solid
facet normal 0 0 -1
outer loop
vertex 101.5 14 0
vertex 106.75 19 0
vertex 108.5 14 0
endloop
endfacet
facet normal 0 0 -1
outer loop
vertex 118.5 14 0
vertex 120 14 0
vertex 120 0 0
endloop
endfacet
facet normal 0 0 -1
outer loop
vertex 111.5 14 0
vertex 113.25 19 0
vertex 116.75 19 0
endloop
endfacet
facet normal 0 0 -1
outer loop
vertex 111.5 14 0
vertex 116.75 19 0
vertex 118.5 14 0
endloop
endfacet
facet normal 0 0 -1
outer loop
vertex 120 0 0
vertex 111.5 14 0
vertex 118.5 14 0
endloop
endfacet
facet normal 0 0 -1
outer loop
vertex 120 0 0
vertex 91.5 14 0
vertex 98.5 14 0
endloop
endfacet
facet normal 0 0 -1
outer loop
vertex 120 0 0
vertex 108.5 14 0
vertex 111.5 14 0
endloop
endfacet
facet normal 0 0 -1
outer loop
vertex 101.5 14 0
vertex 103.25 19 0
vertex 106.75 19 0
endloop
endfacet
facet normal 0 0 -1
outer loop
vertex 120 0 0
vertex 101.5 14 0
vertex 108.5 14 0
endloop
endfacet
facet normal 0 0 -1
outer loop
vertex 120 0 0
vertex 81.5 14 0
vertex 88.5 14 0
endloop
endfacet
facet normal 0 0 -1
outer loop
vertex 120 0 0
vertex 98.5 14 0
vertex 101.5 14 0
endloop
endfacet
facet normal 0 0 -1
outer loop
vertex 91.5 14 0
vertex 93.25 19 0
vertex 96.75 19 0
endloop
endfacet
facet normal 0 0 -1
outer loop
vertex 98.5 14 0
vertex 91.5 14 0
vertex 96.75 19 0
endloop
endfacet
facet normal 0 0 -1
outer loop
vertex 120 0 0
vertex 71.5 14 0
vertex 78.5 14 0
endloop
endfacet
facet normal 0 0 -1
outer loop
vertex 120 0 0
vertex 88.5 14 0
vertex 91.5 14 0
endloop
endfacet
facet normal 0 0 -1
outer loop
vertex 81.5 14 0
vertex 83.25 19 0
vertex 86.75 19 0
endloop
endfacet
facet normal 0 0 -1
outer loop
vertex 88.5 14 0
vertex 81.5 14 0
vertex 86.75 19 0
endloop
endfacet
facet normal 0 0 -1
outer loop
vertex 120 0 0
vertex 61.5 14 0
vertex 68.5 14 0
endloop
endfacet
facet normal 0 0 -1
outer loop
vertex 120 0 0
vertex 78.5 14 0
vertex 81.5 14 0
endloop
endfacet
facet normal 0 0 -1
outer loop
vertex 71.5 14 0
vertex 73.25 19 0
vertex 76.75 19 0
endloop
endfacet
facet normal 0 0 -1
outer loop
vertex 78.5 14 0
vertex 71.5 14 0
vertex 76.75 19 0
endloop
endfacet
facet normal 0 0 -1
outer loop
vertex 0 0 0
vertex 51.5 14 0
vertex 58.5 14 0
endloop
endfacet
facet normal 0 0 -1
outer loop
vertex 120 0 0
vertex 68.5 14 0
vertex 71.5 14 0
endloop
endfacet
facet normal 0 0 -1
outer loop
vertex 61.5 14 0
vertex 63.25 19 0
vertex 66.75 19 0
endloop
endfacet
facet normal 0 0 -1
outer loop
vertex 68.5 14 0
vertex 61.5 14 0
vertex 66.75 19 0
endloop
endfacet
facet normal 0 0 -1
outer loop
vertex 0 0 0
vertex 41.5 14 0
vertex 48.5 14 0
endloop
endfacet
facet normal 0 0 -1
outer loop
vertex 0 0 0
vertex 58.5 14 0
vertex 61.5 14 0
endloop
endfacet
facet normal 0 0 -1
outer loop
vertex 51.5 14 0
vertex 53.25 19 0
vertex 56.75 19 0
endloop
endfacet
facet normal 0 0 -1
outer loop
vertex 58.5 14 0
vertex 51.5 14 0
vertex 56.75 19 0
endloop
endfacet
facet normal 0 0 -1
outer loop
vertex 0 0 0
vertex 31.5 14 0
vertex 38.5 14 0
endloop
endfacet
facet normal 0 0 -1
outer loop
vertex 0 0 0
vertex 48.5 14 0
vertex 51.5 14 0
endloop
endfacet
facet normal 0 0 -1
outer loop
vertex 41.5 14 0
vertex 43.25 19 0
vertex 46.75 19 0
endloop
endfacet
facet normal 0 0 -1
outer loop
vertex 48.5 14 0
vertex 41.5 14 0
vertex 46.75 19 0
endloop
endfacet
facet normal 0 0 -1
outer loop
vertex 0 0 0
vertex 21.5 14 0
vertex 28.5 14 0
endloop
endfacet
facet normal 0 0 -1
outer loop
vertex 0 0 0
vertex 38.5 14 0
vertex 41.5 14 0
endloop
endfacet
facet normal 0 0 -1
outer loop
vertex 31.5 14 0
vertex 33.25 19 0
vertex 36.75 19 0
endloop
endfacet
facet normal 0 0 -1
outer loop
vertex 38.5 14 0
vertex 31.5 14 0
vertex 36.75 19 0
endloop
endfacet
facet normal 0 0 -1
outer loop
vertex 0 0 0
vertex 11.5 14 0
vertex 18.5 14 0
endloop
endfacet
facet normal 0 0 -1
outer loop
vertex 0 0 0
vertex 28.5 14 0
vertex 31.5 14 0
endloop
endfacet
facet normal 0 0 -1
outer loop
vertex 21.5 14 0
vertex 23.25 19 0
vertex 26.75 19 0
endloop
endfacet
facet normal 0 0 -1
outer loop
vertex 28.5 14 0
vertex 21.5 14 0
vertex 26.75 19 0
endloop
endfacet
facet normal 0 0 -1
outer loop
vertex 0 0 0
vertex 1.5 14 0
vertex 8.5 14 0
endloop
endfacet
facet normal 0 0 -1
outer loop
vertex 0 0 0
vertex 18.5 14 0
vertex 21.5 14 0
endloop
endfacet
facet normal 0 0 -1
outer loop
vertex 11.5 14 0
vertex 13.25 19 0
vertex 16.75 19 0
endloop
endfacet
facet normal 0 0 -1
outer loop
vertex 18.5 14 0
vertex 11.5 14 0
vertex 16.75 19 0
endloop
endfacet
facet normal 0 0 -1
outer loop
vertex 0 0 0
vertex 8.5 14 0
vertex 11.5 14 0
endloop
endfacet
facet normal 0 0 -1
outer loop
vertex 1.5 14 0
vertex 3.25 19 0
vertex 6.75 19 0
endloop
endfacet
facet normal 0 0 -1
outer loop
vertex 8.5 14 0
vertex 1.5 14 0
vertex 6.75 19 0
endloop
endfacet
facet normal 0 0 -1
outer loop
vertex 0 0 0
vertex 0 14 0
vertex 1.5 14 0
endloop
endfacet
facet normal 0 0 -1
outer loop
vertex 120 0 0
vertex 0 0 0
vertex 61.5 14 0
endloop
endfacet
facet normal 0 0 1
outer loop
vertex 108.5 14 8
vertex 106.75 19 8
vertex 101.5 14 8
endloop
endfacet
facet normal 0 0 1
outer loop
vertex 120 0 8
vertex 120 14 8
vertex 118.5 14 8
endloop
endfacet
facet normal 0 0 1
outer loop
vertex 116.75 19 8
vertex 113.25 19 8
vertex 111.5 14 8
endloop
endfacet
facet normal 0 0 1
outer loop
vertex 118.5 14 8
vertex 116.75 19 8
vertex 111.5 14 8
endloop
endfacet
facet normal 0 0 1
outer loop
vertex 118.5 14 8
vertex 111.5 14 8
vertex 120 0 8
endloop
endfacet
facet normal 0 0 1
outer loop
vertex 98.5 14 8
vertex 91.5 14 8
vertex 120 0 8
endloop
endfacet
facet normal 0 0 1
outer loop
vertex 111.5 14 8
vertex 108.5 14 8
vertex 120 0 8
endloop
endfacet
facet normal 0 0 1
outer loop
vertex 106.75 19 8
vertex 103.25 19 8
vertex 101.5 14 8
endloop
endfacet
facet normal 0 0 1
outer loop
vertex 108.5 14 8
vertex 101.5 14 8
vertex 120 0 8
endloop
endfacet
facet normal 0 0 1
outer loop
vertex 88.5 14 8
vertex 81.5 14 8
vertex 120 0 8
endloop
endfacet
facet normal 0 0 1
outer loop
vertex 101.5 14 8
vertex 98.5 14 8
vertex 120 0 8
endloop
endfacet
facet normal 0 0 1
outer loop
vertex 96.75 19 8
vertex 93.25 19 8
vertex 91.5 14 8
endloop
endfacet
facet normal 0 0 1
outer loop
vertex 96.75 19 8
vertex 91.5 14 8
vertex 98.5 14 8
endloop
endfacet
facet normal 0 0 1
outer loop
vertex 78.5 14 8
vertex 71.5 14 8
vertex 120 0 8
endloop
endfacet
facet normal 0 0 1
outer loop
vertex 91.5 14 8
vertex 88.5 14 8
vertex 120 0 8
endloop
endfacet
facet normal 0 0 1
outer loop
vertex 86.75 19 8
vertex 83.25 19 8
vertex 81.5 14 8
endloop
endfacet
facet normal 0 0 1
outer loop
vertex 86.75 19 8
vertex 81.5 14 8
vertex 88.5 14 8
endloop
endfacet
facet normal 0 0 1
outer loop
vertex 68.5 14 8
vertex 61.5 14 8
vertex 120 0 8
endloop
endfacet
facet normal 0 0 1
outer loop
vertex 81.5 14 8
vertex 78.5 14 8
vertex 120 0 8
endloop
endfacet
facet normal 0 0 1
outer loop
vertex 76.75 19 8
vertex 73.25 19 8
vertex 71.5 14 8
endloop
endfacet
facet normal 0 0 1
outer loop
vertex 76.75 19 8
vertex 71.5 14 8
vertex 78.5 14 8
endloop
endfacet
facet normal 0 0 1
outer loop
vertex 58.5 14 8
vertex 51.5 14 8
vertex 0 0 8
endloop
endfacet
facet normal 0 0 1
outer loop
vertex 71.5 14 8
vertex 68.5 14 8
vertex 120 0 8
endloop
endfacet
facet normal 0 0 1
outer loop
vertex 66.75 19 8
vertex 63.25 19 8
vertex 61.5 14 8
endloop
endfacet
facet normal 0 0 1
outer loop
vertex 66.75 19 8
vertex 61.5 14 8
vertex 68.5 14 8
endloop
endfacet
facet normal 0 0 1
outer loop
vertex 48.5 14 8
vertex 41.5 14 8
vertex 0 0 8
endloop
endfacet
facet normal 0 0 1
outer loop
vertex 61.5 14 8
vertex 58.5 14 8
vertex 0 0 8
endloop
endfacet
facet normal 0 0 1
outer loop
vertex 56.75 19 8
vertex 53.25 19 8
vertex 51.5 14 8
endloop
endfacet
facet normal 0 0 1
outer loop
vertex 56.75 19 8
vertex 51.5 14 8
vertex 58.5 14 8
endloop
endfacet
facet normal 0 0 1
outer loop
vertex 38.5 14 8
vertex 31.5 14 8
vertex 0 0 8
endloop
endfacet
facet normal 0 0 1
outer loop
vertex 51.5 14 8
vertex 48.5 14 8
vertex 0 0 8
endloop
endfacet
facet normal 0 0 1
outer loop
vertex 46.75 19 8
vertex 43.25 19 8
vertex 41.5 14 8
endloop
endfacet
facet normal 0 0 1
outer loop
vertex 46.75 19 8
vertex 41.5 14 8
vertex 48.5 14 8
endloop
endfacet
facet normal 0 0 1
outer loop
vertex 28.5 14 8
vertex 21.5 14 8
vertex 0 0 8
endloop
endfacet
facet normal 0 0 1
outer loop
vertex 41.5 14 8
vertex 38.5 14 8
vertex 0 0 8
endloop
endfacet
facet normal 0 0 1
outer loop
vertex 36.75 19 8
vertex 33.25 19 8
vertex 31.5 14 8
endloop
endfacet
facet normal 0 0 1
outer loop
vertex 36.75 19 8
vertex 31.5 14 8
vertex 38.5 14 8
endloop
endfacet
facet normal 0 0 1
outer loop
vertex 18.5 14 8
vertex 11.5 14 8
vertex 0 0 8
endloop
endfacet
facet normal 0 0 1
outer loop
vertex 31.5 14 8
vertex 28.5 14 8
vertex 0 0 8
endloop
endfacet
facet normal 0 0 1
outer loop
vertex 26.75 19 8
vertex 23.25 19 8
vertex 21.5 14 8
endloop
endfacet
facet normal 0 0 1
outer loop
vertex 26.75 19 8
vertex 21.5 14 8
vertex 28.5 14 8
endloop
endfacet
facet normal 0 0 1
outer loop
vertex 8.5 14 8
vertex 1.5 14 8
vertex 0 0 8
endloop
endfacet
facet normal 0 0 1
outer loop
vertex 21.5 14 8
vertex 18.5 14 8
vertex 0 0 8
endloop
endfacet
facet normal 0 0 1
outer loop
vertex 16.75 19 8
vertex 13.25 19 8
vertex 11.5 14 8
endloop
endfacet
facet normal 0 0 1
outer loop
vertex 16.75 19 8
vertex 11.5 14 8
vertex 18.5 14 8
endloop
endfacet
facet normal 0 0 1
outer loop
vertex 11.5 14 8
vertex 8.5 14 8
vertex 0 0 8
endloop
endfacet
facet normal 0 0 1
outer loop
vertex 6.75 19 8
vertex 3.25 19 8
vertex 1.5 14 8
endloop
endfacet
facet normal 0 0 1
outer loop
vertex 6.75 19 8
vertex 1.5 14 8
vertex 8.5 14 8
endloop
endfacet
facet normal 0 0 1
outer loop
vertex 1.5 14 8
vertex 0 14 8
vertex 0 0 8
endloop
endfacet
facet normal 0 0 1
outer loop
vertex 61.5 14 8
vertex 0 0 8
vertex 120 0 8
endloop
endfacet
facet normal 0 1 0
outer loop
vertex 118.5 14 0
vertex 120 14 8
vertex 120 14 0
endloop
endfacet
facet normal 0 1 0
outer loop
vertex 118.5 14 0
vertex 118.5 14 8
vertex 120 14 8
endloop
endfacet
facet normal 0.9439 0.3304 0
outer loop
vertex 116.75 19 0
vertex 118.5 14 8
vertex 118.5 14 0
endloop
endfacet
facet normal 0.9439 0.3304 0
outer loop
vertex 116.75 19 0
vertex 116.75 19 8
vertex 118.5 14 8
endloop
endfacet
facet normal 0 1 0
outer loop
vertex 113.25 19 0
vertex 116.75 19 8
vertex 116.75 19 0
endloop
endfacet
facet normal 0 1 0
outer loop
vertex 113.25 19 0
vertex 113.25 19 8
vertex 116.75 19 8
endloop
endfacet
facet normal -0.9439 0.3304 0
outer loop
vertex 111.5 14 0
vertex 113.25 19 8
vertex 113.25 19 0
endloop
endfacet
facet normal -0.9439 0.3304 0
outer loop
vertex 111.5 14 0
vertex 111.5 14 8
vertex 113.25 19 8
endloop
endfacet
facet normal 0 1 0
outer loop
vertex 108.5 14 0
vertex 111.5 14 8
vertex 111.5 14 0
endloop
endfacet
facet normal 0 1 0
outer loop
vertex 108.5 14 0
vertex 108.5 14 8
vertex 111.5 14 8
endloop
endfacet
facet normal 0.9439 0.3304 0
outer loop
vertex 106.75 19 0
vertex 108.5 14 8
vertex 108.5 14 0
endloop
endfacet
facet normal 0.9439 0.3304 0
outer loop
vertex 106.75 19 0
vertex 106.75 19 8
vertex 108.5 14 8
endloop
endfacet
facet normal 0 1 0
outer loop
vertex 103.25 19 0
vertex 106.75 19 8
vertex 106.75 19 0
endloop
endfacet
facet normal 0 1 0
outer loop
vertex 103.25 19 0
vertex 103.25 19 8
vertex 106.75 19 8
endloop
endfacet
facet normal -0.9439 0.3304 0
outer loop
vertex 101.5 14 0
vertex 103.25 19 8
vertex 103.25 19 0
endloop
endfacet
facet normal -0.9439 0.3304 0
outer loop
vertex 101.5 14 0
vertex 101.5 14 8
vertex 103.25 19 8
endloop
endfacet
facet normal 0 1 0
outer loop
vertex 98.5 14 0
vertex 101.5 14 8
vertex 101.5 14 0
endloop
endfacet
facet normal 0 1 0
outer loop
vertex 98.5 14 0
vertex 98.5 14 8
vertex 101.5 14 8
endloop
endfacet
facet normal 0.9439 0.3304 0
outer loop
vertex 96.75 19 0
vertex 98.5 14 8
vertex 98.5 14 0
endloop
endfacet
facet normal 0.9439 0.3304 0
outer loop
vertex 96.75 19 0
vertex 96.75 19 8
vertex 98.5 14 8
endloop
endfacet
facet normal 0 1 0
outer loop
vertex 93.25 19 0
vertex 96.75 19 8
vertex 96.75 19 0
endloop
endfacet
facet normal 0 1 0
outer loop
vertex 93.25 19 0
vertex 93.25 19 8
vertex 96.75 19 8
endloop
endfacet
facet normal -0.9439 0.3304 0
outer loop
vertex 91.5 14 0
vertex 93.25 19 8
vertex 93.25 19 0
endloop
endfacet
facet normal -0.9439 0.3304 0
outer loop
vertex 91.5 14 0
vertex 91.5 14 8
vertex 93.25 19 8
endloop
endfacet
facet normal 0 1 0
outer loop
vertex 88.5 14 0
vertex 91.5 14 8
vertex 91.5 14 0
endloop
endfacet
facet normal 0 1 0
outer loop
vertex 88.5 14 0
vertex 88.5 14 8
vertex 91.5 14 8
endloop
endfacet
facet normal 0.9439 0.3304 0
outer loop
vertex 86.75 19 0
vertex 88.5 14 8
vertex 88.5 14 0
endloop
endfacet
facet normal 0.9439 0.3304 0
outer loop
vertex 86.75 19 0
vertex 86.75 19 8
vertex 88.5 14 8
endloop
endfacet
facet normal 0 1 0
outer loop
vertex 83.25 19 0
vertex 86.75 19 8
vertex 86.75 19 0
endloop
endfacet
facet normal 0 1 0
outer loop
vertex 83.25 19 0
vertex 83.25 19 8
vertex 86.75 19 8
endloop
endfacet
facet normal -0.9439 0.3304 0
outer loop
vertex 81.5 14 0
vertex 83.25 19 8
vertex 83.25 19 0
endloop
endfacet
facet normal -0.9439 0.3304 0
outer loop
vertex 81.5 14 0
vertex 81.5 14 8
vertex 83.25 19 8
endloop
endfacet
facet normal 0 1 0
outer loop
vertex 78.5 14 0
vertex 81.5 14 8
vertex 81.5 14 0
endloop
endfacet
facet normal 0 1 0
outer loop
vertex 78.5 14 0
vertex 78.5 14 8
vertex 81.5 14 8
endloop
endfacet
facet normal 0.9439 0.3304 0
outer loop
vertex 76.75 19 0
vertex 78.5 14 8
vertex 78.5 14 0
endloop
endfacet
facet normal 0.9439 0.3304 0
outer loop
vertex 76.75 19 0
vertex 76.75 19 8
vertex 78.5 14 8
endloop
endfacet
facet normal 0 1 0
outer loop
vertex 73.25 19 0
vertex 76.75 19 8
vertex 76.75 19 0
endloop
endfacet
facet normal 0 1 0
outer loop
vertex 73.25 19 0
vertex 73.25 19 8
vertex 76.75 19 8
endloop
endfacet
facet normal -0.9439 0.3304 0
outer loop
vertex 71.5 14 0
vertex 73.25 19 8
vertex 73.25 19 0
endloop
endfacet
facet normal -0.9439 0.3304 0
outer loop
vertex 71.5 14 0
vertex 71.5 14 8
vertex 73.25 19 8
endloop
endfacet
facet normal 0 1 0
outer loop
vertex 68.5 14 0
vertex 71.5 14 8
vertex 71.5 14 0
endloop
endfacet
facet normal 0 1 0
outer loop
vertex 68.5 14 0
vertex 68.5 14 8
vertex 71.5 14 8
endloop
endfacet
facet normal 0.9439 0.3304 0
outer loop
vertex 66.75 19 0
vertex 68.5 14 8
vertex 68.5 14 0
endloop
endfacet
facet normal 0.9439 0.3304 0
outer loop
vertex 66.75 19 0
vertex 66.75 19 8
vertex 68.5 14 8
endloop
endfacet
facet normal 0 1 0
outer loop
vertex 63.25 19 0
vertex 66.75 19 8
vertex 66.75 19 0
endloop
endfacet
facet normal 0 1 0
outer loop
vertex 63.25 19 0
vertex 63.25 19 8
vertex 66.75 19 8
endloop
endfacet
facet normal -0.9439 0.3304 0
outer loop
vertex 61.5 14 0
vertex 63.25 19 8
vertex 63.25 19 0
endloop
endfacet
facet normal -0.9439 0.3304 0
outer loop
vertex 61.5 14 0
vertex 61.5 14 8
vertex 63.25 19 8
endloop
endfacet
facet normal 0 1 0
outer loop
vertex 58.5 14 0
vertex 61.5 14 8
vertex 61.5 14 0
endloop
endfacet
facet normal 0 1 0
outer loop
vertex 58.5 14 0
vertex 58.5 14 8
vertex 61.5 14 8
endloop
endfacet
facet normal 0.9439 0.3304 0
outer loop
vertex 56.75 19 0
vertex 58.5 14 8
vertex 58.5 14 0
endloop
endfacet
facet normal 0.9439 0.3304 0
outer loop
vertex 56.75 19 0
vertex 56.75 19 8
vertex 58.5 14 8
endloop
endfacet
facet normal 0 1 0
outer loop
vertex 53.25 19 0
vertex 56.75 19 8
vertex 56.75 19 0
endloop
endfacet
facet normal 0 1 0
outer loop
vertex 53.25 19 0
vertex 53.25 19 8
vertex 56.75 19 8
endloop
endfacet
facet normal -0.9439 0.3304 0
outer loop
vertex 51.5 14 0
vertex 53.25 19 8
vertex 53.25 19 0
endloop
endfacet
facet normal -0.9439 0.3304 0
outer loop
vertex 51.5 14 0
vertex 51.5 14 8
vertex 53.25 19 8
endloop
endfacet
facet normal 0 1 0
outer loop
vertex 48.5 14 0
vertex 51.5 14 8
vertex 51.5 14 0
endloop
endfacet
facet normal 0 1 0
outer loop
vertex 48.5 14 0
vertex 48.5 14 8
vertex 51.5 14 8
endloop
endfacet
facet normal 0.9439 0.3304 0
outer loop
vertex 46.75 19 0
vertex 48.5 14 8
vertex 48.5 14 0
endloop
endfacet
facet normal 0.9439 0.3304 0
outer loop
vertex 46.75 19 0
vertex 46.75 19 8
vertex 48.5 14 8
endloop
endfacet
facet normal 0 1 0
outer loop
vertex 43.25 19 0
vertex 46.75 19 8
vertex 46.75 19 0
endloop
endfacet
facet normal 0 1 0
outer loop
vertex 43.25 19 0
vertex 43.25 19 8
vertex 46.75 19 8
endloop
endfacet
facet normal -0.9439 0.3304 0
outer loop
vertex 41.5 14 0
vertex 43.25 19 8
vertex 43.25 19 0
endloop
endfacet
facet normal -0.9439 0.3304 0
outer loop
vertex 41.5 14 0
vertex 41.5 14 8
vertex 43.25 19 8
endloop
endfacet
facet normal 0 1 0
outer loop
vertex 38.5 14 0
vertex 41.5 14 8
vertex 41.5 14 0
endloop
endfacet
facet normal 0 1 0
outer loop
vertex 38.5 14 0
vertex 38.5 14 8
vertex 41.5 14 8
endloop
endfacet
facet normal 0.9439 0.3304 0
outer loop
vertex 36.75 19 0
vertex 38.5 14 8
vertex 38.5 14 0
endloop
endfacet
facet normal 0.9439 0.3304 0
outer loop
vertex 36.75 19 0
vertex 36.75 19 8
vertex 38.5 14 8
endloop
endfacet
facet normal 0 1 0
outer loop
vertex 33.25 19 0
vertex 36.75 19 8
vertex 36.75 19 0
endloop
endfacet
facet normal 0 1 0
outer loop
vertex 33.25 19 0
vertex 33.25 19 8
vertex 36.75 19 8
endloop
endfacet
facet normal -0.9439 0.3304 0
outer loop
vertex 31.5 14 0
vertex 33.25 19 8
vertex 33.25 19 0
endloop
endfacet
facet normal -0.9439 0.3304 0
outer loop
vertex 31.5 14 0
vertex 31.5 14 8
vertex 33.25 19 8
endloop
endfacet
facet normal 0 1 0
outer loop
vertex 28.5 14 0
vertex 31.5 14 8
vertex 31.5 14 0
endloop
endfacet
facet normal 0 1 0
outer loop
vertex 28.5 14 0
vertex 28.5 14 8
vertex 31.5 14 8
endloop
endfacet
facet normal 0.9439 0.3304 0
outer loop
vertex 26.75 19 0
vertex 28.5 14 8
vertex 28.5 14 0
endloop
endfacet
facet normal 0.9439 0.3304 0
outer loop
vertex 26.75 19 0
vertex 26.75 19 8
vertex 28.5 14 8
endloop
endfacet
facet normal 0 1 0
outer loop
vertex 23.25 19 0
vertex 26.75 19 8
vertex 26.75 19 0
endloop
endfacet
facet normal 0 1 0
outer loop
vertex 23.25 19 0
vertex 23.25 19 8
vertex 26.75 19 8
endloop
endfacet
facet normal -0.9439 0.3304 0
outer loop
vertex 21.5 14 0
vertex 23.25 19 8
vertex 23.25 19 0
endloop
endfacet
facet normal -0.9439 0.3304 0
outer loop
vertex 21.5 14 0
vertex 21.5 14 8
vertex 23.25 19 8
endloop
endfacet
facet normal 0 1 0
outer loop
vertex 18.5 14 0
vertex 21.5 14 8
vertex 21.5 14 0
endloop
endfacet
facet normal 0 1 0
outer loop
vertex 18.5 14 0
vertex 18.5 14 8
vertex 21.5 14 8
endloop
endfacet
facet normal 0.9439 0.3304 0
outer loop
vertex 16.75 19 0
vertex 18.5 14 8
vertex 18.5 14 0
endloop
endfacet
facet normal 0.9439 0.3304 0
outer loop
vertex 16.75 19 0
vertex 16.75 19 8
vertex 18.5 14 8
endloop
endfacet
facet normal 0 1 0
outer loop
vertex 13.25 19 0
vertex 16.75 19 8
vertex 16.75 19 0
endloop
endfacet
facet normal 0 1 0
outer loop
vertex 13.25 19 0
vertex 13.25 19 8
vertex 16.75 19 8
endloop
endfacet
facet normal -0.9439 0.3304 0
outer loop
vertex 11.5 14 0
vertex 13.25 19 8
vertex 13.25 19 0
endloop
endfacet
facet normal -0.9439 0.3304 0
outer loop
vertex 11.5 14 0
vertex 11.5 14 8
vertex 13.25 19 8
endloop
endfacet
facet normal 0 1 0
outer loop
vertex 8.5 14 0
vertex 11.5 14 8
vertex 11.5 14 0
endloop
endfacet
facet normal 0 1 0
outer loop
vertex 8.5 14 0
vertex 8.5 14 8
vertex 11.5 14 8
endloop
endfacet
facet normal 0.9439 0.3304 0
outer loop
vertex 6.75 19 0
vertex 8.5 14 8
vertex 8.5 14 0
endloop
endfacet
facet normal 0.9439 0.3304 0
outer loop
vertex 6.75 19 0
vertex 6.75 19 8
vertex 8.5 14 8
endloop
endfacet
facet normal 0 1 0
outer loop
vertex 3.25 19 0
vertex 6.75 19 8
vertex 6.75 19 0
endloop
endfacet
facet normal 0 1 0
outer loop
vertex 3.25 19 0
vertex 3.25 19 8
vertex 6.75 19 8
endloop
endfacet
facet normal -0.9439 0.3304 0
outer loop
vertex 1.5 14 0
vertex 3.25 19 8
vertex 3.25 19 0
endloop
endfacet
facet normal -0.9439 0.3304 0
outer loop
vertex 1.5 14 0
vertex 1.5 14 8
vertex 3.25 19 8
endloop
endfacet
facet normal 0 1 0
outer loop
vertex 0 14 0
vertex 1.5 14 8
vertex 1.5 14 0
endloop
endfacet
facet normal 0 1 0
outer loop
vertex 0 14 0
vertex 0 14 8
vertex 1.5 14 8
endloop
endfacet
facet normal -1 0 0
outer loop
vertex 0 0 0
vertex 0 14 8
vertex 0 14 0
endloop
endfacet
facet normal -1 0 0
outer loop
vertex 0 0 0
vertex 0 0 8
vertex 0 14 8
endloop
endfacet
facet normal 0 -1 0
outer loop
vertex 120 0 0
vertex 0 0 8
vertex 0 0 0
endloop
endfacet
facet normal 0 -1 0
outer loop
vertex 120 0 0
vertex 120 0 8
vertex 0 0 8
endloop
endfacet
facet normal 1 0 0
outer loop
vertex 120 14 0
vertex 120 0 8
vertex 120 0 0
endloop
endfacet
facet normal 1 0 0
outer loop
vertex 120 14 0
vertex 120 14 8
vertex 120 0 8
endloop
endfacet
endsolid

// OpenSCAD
$fn = 32;

// ----------------------------------------------------------------------
// Gear rack: 12 teeth, pitch 10 mm
// ----------------------------------------------------------------------

// --- parameters (mm) ---
teeth = 12;               // number of teeth
pitch = 10;               // tooth pitch, X
root_w = 7;               // tooth width at the root
tip_w = 3.5;              // tooth width at the tip
base_h = 14;              // rack body height, Y
tooth_h = 5;              // tooth height above the body
plate_t = 8;              // rack width, Z (extrusion height)

rack_l = teeth * pitch;  // overall length
total_h = base_h + tooth_h;  // overall height

profile = [[0, 0], [120, 0], [120, 14], [118.5, 14], [116.75, 19], [113.25, 19], [111.5, 14], [108.5, 14], [106.75, 19], [103.25, 19], [101.5, 14], [98.5, 14], [96.75, 19], [93.25, 19], [91.5, 14], [88.5, 14], [86.75, 19], [83.25, 19], [81.5, 14], [78.5, 14], [76.75, 19], [73.25, 19], [71.5, 14], [68.5, 14], [66.75, 19], [63.25, 19], [61.5, 14], [58.5, 14], [56.75, 19], [53.25, 19], [51.5, 14], [48.5, 14], [46.75, 19], [43.25, 19], [41.5, 14], [38.5, 14], [36.75, 19], [33.25, 19], [31.5, 14], [28.5, 14], [26.75, 19], [23.25, 19], [21.5, 14], [18.5, 14], [16.75, 19], [13.25, 19], [11.5, 14], [8.5, 14], [6.75, 19], [3.25, 19], [1.5, 14], [0, 14]];  // primary outline, 52 points, counter clockwise

// --- the one profile operation ---
linear_extrude(height = plate_t) polygon(points = profile);
